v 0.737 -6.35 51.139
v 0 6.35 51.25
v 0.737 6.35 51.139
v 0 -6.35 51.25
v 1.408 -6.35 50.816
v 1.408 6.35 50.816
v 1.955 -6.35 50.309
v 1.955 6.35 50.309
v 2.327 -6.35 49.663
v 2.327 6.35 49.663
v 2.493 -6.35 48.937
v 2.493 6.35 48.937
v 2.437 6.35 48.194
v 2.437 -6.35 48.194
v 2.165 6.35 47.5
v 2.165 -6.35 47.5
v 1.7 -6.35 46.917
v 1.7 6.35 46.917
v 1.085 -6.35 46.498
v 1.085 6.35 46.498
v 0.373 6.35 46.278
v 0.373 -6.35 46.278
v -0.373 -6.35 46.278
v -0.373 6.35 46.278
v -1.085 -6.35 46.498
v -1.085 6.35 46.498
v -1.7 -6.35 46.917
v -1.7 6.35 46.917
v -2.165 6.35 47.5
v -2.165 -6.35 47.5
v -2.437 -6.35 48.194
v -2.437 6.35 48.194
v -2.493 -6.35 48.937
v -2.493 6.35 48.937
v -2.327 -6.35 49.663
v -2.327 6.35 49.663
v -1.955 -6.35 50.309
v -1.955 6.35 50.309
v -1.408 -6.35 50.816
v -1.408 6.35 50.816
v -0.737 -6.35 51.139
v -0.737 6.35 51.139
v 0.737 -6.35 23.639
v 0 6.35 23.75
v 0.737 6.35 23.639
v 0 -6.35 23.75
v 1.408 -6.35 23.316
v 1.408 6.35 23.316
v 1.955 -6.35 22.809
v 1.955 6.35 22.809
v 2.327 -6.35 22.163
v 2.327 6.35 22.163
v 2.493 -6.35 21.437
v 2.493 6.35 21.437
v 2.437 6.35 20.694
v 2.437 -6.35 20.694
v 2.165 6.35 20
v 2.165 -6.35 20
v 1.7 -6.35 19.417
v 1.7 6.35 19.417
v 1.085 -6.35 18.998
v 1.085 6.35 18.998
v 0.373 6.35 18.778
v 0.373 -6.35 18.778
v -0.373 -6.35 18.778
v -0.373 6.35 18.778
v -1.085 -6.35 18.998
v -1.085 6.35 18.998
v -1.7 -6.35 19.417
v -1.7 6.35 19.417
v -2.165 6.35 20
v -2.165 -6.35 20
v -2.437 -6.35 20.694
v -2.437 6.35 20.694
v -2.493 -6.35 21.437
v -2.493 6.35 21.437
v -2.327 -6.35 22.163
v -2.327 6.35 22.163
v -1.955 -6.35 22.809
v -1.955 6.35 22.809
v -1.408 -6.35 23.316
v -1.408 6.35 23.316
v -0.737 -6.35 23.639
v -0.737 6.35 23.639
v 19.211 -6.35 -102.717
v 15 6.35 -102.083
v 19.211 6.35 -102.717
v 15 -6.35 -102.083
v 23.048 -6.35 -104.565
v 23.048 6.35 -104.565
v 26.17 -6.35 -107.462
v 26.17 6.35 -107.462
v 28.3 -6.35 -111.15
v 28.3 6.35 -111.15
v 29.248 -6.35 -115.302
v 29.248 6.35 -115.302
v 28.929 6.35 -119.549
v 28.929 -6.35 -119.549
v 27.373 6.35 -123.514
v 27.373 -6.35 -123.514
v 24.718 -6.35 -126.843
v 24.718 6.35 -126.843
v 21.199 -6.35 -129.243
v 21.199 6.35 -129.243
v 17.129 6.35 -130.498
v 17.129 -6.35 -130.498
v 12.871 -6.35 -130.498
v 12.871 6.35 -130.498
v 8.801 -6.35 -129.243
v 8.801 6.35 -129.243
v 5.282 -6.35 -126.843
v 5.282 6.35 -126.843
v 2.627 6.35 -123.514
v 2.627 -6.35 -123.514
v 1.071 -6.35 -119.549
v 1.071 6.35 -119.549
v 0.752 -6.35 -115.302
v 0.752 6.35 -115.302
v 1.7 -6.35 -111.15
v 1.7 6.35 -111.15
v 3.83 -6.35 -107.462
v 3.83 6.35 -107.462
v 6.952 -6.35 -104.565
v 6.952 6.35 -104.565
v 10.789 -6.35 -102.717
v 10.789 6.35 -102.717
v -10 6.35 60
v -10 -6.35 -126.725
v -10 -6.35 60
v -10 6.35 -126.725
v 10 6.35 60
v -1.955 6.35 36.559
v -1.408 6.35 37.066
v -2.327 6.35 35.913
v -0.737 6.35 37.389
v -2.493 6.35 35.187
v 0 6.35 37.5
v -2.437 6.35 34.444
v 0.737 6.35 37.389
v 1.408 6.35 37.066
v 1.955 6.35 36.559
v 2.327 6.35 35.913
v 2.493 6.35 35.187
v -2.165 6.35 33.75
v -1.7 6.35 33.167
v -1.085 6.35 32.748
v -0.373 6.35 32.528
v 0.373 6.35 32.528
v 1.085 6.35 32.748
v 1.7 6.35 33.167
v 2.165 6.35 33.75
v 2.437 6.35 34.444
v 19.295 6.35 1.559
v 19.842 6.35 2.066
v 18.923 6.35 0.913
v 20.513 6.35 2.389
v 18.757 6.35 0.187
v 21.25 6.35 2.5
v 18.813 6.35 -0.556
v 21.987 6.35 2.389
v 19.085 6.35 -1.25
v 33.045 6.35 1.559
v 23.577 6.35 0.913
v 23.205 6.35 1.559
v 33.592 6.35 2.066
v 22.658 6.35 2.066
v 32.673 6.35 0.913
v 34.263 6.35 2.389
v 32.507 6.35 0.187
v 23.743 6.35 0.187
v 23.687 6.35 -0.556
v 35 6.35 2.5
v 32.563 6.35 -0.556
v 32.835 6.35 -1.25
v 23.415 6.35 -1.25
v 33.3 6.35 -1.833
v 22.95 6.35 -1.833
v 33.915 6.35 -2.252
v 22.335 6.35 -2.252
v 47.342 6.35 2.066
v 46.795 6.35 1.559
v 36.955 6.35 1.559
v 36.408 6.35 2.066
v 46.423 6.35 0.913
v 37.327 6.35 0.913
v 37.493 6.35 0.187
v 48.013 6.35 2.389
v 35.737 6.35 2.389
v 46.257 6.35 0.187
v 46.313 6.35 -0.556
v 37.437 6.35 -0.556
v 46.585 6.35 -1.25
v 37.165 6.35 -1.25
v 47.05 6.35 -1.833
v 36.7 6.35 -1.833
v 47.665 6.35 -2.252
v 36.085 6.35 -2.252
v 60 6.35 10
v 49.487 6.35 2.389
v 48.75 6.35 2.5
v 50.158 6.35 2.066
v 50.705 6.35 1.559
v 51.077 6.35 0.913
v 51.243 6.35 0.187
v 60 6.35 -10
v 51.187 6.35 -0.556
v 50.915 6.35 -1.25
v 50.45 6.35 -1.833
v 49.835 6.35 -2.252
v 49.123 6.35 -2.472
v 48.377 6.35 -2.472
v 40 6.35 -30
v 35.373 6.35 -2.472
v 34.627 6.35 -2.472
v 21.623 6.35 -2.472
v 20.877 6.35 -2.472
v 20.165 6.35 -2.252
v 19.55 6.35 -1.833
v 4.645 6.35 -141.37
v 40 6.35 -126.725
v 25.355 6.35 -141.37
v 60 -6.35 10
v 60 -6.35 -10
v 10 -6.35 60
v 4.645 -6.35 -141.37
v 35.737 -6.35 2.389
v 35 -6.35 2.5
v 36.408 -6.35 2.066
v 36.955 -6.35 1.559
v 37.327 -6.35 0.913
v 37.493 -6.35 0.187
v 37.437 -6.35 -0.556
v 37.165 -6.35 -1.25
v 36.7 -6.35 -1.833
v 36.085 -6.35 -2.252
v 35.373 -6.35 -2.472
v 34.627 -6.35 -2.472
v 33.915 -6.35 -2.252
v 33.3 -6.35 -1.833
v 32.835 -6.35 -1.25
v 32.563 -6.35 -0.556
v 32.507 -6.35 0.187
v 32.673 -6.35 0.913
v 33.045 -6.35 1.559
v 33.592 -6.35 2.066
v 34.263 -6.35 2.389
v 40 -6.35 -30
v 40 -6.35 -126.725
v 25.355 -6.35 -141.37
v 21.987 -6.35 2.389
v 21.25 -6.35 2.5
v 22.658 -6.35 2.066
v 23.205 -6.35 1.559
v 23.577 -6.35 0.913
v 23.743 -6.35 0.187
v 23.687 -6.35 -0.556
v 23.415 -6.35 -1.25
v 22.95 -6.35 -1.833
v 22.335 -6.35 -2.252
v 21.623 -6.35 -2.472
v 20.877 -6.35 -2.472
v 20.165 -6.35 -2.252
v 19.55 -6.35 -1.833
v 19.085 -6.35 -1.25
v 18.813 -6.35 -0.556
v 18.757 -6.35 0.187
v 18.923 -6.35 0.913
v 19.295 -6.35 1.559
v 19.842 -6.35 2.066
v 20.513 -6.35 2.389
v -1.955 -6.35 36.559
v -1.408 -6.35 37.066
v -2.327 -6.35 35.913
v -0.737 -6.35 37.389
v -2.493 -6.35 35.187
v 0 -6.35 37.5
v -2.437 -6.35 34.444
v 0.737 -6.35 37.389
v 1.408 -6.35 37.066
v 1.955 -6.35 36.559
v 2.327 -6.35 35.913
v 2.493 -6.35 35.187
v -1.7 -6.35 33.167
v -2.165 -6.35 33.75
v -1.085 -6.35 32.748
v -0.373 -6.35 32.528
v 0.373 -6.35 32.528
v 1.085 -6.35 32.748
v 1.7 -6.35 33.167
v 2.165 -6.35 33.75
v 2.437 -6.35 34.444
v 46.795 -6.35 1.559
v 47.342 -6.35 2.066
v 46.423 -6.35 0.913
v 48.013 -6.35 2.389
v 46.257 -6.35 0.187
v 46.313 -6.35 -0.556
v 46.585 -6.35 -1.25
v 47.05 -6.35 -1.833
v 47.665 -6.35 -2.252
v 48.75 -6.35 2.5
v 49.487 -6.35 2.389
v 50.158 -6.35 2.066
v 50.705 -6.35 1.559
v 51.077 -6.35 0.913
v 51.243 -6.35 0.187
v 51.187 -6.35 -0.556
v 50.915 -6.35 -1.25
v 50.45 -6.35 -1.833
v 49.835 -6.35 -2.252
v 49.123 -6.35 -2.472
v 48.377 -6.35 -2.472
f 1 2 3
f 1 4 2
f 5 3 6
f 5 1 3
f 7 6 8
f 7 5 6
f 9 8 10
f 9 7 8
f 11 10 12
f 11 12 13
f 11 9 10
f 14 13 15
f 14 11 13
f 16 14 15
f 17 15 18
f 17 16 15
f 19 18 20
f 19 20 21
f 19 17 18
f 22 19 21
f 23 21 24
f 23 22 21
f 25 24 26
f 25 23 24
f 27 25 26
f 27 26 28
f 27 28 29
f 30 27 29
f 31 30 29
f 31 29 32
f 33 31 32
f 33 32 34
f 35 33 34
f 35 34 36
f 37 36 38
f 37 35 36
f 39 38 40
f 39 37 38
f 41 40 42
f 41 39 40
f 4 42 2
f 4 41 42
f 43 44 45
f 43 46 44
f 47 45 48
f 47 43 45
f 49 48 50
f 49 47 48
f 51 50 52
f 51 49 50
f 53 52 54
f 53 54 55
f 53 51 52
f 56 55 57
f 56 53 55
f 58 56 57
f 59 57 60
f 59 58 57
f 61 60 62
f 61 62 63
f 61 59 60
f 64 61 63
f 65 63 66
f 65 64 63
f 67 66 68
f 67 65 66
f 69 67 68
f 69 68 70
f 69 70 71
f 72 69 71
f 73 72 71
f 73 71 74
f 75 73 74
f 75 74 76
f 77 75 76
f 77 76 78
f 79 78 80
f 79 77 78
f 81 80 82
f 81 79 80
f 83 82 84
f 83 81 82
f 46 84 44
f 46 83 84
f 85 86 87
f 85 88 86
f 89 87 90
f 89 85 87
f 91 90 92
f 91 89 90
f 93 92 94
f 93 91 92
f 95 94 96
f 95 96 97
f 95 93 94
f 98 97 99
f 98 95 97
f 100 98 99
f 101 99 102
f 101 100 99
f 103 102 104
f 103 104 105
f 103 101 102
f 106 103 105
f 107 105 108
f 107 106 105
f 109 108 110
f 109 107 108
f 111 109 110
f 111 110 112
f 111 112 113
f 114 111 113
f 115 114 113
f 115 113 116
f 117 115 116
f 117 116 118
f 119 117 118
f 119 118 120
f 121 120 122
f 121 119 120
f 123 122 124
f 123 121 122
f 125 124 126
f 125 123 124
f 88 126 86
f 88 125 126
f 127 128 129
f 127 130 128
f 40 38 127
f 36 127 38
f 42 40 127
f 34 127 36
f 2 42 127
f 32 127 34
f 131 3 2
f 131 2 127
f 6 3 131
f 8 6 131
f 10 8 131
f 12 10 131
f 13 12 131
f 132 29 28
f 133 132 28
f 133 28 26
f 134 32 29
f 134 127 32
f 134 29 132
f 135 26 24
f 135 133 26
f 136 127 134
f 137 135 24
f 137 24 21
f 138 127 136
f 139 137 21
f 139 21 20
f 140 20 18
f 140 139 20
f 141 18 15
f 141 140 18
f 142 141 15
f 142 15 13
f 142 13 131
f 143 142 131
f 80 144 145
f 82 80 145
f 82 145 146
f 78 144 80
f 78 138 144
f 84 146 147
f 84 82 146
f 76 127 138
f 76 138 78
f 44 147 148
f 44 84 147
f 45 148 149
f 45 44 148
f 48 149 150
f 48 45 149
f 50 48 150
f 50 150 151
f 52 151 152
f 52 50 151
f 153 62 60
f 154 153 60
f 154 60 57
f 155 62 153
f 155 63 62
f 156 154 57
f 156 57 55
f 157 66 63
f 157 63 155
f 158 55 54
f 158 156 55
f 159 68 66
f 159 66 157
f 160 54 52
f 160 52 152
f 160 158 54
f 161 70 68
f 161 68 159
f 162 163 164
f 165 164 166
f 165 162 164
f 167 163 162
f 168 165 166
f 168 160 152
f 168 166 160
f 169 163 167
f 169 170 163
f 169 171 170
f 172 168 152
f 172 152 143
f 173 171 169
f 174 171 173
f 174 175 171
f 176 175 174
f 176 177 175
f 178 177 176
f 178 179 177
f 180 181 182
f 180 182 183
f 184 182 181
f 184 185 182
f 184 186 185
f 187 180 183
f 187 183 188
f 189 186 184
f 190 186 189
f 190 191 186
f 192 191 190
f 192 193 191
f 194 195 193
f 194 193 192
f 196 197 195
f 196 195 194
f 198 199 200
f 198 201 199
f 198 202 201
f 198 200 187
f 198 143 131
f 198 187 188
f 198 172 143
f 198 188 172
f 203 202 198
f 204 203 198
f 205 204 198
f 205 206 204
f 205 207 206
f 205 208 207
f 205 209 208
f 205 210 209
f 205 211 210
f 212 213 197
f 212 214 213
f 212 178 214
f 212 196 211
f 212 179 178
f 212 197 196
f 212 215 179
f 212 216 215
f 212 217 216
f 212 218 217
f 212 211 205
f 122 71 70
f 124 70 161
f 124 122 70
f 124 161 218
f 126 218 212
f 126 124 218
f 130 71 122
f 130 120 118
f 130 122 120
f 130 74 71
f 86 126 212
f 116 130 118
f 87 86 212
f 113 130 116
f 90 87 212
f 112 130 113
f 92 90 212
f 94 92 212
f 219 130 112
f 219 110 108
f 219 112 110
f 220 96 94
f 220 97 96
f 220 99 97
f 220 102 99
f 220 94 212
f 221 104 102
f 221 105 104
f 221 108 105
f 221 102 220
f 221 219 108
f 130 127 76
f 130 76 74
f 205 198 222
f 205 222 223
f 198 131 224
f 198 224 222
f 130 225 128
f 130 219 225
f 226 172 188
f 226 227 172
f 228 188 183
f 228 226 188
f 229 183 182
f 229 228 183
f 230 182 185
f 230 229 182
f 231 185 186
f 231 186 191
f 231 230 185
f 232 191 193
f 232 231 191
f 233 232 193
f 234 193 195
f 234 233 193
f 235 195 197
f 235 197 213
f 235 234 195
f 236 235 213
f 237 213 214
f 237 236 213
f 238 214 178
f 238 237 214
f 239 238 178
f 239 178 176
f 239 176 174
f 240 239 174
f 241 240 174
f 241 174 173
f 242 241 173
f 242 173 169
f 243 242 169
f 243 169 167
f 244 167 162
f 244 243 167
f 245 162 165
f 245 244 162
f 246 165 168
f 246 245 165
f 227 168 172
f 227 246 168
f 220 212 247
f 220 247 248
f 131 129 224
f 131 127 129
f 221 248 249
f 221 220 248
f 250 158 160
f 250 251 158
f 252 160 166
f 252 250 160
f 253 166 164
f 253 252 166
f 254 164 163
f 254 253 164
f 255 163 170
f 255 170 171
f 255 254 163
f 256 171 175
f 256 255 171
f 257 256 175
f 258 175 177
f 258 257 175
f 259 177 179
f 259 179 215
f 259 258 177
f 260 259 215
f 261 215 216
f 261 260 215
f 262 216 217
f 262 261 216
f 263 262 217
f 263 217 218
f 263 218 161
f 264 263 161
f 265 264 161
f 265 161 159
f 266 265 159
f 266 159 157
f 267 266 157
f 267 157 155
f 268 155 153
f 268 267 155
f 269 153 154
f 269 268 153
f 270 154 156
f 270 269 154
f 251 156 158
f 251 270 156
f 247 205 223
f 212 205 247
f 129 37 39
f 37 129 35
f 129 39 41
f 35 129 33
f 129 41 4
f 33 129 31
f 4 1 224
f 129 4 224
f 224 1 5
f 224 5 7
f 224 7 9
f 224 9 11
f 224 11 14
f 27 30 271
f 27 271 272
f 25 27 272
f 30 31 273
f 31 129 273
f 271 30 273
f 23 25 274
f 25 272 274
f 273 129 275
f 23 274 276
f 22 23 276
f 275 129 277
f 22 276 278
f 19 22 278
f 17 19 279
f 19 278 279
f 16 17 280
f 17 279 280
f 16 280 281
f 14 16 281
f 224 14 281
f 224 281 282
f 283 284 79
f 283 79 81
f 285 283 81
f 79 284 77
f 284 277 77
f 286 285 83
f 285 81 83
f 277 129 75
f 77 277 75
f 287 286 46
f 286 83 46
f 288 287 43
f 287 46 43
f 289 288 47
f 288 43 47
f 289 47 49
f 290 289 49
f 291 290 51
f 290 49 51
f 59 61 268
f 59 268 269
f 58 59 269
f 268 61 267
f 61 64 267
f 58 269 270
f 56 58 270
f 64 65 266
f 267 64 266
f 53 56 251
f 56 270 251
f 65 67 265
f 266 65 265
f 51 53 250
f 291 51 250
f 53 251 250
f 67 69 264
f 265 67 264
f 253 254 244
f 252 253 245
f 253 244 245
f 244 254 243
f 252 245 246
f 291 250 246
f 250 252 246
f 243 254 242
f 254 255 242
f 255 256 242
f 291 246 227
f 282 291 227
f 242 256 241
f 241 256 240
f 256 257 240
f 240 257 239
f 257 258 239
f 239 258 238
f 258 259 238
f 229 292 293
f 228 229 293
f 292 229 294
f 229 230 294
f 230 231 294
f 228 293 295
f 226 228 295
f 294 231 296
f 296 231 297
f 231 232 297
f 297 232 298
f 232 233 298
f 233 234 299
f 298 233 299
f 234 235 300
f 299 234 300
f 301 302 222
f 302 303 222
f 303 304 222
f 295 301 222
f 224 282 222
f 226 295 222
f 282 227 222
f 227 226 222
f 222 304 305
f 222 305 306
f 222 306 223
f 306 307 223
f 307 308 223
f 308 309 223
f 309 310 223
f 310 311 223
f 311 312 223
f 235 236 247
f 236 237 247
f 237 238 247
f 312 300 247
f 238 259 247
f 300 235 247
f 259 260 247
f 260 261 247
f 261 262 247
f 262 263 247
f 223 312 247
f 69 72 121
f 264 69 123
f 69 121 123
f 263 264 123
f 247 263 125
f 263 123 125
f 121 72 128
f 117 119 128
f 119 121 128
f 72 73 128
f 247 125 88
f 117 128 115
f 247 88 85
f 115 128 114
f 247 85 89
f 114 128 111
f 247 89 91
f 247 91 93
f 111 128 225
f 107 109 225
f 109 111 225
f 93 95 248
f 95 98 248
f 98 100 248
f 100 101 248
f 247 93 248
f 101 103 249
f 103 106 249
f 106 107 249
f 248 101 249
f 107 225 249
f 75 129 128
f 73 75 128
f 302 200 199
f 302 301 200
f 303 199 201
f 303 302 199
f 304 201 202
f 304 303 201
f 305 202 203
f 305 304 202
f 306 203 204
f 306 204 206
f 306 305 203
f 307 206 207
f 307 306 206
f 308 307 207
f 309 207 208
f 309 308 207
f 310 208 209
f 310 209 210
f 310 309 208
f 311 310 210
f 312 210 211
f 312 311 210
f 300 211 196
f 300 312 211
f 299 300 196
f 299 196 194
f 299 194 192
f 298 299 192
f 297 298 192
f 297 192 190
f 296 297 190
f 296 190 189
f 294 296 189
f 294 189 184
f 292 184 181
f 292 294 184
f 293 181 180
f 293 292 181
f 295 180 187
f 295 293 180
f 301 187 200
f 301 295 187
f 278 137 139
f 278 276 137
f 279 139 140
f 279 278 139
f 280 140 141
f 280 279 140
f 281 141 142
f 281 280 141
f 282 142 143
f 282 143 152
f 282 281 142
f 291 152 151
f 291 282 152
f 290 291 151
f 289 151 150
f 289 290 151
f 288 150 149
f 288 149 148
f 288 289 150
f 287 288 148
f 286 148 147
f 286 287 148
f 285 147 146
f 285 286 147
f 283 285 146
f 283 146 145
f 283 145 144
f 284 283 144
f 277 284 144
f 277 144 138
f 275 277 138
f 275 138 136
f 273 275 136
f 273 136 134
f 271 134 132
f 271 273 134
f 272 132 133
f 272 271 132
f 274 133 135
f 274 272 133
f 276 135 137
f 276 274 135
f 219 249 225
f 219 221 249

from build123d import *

# Parameters (mm, degrees)
SKETCH1_R           = 14.2875
SKETCH1_R_2         = 2.5
BOSS_EXTRUDE1_DEPTH = 6.35


with BuildPart() as part:
    # Sketch1 → Boss-Extrude1 (new, symmetric)
    with BuildSketch(Plane(origin=(0, 0, 0), x_dir=(1, 0, 0), z_dir=(0, 1, 0))):
        Polygon((-10, -60), (10, -60), (60, -10), (60, 10), (40, 30), (40, 126.725339059), (25.355339059, 141.37), (4.644660941, 141.37), (-10, 126.725339059), align=None)
        with Locations(Location((15, 116.37, 0), (0, 0, 270))):
            Circle(SKETCH1_R, mode=Mode.SUBTRACT)
        with Locations(Location((48.75, 0, 0), (0, 0, 270))):
            Circle(SKETCH1_R_2, mode=Mode.SUBTRACT)
        with Locations(Location((35, 0, 0), (0, 0, 270))):
            Circle(SKETCH1_R_2, mode=Mode.SUBTRACT)
        with Locations(Location((21.25, 0, 0), (0, 0, 270))):
            Circle(SKETCH1_R_2, mode=Mode.SUBTRACT)
        with Locations(Location((0, -48.75, 0), (0, 0, 270))):
            Circle(SKETCH1_R_2, mode=Mode.SUBTRACT)
        with Locations(Location((0, -35, 0), (0, 0, 270))):
            Circle(SKETCH1_R_2, mode=Mode.SUBTRACT)
        with Locations(Location((0, -21.25, 0), (0, 0, 270))):
            Circle(SKETCH1_R_2, mode=Mode.SUBTRACT)
    extrude(amount=BOSS_EXTRUDE1_DEPTH, both=True)


solid = part.part
